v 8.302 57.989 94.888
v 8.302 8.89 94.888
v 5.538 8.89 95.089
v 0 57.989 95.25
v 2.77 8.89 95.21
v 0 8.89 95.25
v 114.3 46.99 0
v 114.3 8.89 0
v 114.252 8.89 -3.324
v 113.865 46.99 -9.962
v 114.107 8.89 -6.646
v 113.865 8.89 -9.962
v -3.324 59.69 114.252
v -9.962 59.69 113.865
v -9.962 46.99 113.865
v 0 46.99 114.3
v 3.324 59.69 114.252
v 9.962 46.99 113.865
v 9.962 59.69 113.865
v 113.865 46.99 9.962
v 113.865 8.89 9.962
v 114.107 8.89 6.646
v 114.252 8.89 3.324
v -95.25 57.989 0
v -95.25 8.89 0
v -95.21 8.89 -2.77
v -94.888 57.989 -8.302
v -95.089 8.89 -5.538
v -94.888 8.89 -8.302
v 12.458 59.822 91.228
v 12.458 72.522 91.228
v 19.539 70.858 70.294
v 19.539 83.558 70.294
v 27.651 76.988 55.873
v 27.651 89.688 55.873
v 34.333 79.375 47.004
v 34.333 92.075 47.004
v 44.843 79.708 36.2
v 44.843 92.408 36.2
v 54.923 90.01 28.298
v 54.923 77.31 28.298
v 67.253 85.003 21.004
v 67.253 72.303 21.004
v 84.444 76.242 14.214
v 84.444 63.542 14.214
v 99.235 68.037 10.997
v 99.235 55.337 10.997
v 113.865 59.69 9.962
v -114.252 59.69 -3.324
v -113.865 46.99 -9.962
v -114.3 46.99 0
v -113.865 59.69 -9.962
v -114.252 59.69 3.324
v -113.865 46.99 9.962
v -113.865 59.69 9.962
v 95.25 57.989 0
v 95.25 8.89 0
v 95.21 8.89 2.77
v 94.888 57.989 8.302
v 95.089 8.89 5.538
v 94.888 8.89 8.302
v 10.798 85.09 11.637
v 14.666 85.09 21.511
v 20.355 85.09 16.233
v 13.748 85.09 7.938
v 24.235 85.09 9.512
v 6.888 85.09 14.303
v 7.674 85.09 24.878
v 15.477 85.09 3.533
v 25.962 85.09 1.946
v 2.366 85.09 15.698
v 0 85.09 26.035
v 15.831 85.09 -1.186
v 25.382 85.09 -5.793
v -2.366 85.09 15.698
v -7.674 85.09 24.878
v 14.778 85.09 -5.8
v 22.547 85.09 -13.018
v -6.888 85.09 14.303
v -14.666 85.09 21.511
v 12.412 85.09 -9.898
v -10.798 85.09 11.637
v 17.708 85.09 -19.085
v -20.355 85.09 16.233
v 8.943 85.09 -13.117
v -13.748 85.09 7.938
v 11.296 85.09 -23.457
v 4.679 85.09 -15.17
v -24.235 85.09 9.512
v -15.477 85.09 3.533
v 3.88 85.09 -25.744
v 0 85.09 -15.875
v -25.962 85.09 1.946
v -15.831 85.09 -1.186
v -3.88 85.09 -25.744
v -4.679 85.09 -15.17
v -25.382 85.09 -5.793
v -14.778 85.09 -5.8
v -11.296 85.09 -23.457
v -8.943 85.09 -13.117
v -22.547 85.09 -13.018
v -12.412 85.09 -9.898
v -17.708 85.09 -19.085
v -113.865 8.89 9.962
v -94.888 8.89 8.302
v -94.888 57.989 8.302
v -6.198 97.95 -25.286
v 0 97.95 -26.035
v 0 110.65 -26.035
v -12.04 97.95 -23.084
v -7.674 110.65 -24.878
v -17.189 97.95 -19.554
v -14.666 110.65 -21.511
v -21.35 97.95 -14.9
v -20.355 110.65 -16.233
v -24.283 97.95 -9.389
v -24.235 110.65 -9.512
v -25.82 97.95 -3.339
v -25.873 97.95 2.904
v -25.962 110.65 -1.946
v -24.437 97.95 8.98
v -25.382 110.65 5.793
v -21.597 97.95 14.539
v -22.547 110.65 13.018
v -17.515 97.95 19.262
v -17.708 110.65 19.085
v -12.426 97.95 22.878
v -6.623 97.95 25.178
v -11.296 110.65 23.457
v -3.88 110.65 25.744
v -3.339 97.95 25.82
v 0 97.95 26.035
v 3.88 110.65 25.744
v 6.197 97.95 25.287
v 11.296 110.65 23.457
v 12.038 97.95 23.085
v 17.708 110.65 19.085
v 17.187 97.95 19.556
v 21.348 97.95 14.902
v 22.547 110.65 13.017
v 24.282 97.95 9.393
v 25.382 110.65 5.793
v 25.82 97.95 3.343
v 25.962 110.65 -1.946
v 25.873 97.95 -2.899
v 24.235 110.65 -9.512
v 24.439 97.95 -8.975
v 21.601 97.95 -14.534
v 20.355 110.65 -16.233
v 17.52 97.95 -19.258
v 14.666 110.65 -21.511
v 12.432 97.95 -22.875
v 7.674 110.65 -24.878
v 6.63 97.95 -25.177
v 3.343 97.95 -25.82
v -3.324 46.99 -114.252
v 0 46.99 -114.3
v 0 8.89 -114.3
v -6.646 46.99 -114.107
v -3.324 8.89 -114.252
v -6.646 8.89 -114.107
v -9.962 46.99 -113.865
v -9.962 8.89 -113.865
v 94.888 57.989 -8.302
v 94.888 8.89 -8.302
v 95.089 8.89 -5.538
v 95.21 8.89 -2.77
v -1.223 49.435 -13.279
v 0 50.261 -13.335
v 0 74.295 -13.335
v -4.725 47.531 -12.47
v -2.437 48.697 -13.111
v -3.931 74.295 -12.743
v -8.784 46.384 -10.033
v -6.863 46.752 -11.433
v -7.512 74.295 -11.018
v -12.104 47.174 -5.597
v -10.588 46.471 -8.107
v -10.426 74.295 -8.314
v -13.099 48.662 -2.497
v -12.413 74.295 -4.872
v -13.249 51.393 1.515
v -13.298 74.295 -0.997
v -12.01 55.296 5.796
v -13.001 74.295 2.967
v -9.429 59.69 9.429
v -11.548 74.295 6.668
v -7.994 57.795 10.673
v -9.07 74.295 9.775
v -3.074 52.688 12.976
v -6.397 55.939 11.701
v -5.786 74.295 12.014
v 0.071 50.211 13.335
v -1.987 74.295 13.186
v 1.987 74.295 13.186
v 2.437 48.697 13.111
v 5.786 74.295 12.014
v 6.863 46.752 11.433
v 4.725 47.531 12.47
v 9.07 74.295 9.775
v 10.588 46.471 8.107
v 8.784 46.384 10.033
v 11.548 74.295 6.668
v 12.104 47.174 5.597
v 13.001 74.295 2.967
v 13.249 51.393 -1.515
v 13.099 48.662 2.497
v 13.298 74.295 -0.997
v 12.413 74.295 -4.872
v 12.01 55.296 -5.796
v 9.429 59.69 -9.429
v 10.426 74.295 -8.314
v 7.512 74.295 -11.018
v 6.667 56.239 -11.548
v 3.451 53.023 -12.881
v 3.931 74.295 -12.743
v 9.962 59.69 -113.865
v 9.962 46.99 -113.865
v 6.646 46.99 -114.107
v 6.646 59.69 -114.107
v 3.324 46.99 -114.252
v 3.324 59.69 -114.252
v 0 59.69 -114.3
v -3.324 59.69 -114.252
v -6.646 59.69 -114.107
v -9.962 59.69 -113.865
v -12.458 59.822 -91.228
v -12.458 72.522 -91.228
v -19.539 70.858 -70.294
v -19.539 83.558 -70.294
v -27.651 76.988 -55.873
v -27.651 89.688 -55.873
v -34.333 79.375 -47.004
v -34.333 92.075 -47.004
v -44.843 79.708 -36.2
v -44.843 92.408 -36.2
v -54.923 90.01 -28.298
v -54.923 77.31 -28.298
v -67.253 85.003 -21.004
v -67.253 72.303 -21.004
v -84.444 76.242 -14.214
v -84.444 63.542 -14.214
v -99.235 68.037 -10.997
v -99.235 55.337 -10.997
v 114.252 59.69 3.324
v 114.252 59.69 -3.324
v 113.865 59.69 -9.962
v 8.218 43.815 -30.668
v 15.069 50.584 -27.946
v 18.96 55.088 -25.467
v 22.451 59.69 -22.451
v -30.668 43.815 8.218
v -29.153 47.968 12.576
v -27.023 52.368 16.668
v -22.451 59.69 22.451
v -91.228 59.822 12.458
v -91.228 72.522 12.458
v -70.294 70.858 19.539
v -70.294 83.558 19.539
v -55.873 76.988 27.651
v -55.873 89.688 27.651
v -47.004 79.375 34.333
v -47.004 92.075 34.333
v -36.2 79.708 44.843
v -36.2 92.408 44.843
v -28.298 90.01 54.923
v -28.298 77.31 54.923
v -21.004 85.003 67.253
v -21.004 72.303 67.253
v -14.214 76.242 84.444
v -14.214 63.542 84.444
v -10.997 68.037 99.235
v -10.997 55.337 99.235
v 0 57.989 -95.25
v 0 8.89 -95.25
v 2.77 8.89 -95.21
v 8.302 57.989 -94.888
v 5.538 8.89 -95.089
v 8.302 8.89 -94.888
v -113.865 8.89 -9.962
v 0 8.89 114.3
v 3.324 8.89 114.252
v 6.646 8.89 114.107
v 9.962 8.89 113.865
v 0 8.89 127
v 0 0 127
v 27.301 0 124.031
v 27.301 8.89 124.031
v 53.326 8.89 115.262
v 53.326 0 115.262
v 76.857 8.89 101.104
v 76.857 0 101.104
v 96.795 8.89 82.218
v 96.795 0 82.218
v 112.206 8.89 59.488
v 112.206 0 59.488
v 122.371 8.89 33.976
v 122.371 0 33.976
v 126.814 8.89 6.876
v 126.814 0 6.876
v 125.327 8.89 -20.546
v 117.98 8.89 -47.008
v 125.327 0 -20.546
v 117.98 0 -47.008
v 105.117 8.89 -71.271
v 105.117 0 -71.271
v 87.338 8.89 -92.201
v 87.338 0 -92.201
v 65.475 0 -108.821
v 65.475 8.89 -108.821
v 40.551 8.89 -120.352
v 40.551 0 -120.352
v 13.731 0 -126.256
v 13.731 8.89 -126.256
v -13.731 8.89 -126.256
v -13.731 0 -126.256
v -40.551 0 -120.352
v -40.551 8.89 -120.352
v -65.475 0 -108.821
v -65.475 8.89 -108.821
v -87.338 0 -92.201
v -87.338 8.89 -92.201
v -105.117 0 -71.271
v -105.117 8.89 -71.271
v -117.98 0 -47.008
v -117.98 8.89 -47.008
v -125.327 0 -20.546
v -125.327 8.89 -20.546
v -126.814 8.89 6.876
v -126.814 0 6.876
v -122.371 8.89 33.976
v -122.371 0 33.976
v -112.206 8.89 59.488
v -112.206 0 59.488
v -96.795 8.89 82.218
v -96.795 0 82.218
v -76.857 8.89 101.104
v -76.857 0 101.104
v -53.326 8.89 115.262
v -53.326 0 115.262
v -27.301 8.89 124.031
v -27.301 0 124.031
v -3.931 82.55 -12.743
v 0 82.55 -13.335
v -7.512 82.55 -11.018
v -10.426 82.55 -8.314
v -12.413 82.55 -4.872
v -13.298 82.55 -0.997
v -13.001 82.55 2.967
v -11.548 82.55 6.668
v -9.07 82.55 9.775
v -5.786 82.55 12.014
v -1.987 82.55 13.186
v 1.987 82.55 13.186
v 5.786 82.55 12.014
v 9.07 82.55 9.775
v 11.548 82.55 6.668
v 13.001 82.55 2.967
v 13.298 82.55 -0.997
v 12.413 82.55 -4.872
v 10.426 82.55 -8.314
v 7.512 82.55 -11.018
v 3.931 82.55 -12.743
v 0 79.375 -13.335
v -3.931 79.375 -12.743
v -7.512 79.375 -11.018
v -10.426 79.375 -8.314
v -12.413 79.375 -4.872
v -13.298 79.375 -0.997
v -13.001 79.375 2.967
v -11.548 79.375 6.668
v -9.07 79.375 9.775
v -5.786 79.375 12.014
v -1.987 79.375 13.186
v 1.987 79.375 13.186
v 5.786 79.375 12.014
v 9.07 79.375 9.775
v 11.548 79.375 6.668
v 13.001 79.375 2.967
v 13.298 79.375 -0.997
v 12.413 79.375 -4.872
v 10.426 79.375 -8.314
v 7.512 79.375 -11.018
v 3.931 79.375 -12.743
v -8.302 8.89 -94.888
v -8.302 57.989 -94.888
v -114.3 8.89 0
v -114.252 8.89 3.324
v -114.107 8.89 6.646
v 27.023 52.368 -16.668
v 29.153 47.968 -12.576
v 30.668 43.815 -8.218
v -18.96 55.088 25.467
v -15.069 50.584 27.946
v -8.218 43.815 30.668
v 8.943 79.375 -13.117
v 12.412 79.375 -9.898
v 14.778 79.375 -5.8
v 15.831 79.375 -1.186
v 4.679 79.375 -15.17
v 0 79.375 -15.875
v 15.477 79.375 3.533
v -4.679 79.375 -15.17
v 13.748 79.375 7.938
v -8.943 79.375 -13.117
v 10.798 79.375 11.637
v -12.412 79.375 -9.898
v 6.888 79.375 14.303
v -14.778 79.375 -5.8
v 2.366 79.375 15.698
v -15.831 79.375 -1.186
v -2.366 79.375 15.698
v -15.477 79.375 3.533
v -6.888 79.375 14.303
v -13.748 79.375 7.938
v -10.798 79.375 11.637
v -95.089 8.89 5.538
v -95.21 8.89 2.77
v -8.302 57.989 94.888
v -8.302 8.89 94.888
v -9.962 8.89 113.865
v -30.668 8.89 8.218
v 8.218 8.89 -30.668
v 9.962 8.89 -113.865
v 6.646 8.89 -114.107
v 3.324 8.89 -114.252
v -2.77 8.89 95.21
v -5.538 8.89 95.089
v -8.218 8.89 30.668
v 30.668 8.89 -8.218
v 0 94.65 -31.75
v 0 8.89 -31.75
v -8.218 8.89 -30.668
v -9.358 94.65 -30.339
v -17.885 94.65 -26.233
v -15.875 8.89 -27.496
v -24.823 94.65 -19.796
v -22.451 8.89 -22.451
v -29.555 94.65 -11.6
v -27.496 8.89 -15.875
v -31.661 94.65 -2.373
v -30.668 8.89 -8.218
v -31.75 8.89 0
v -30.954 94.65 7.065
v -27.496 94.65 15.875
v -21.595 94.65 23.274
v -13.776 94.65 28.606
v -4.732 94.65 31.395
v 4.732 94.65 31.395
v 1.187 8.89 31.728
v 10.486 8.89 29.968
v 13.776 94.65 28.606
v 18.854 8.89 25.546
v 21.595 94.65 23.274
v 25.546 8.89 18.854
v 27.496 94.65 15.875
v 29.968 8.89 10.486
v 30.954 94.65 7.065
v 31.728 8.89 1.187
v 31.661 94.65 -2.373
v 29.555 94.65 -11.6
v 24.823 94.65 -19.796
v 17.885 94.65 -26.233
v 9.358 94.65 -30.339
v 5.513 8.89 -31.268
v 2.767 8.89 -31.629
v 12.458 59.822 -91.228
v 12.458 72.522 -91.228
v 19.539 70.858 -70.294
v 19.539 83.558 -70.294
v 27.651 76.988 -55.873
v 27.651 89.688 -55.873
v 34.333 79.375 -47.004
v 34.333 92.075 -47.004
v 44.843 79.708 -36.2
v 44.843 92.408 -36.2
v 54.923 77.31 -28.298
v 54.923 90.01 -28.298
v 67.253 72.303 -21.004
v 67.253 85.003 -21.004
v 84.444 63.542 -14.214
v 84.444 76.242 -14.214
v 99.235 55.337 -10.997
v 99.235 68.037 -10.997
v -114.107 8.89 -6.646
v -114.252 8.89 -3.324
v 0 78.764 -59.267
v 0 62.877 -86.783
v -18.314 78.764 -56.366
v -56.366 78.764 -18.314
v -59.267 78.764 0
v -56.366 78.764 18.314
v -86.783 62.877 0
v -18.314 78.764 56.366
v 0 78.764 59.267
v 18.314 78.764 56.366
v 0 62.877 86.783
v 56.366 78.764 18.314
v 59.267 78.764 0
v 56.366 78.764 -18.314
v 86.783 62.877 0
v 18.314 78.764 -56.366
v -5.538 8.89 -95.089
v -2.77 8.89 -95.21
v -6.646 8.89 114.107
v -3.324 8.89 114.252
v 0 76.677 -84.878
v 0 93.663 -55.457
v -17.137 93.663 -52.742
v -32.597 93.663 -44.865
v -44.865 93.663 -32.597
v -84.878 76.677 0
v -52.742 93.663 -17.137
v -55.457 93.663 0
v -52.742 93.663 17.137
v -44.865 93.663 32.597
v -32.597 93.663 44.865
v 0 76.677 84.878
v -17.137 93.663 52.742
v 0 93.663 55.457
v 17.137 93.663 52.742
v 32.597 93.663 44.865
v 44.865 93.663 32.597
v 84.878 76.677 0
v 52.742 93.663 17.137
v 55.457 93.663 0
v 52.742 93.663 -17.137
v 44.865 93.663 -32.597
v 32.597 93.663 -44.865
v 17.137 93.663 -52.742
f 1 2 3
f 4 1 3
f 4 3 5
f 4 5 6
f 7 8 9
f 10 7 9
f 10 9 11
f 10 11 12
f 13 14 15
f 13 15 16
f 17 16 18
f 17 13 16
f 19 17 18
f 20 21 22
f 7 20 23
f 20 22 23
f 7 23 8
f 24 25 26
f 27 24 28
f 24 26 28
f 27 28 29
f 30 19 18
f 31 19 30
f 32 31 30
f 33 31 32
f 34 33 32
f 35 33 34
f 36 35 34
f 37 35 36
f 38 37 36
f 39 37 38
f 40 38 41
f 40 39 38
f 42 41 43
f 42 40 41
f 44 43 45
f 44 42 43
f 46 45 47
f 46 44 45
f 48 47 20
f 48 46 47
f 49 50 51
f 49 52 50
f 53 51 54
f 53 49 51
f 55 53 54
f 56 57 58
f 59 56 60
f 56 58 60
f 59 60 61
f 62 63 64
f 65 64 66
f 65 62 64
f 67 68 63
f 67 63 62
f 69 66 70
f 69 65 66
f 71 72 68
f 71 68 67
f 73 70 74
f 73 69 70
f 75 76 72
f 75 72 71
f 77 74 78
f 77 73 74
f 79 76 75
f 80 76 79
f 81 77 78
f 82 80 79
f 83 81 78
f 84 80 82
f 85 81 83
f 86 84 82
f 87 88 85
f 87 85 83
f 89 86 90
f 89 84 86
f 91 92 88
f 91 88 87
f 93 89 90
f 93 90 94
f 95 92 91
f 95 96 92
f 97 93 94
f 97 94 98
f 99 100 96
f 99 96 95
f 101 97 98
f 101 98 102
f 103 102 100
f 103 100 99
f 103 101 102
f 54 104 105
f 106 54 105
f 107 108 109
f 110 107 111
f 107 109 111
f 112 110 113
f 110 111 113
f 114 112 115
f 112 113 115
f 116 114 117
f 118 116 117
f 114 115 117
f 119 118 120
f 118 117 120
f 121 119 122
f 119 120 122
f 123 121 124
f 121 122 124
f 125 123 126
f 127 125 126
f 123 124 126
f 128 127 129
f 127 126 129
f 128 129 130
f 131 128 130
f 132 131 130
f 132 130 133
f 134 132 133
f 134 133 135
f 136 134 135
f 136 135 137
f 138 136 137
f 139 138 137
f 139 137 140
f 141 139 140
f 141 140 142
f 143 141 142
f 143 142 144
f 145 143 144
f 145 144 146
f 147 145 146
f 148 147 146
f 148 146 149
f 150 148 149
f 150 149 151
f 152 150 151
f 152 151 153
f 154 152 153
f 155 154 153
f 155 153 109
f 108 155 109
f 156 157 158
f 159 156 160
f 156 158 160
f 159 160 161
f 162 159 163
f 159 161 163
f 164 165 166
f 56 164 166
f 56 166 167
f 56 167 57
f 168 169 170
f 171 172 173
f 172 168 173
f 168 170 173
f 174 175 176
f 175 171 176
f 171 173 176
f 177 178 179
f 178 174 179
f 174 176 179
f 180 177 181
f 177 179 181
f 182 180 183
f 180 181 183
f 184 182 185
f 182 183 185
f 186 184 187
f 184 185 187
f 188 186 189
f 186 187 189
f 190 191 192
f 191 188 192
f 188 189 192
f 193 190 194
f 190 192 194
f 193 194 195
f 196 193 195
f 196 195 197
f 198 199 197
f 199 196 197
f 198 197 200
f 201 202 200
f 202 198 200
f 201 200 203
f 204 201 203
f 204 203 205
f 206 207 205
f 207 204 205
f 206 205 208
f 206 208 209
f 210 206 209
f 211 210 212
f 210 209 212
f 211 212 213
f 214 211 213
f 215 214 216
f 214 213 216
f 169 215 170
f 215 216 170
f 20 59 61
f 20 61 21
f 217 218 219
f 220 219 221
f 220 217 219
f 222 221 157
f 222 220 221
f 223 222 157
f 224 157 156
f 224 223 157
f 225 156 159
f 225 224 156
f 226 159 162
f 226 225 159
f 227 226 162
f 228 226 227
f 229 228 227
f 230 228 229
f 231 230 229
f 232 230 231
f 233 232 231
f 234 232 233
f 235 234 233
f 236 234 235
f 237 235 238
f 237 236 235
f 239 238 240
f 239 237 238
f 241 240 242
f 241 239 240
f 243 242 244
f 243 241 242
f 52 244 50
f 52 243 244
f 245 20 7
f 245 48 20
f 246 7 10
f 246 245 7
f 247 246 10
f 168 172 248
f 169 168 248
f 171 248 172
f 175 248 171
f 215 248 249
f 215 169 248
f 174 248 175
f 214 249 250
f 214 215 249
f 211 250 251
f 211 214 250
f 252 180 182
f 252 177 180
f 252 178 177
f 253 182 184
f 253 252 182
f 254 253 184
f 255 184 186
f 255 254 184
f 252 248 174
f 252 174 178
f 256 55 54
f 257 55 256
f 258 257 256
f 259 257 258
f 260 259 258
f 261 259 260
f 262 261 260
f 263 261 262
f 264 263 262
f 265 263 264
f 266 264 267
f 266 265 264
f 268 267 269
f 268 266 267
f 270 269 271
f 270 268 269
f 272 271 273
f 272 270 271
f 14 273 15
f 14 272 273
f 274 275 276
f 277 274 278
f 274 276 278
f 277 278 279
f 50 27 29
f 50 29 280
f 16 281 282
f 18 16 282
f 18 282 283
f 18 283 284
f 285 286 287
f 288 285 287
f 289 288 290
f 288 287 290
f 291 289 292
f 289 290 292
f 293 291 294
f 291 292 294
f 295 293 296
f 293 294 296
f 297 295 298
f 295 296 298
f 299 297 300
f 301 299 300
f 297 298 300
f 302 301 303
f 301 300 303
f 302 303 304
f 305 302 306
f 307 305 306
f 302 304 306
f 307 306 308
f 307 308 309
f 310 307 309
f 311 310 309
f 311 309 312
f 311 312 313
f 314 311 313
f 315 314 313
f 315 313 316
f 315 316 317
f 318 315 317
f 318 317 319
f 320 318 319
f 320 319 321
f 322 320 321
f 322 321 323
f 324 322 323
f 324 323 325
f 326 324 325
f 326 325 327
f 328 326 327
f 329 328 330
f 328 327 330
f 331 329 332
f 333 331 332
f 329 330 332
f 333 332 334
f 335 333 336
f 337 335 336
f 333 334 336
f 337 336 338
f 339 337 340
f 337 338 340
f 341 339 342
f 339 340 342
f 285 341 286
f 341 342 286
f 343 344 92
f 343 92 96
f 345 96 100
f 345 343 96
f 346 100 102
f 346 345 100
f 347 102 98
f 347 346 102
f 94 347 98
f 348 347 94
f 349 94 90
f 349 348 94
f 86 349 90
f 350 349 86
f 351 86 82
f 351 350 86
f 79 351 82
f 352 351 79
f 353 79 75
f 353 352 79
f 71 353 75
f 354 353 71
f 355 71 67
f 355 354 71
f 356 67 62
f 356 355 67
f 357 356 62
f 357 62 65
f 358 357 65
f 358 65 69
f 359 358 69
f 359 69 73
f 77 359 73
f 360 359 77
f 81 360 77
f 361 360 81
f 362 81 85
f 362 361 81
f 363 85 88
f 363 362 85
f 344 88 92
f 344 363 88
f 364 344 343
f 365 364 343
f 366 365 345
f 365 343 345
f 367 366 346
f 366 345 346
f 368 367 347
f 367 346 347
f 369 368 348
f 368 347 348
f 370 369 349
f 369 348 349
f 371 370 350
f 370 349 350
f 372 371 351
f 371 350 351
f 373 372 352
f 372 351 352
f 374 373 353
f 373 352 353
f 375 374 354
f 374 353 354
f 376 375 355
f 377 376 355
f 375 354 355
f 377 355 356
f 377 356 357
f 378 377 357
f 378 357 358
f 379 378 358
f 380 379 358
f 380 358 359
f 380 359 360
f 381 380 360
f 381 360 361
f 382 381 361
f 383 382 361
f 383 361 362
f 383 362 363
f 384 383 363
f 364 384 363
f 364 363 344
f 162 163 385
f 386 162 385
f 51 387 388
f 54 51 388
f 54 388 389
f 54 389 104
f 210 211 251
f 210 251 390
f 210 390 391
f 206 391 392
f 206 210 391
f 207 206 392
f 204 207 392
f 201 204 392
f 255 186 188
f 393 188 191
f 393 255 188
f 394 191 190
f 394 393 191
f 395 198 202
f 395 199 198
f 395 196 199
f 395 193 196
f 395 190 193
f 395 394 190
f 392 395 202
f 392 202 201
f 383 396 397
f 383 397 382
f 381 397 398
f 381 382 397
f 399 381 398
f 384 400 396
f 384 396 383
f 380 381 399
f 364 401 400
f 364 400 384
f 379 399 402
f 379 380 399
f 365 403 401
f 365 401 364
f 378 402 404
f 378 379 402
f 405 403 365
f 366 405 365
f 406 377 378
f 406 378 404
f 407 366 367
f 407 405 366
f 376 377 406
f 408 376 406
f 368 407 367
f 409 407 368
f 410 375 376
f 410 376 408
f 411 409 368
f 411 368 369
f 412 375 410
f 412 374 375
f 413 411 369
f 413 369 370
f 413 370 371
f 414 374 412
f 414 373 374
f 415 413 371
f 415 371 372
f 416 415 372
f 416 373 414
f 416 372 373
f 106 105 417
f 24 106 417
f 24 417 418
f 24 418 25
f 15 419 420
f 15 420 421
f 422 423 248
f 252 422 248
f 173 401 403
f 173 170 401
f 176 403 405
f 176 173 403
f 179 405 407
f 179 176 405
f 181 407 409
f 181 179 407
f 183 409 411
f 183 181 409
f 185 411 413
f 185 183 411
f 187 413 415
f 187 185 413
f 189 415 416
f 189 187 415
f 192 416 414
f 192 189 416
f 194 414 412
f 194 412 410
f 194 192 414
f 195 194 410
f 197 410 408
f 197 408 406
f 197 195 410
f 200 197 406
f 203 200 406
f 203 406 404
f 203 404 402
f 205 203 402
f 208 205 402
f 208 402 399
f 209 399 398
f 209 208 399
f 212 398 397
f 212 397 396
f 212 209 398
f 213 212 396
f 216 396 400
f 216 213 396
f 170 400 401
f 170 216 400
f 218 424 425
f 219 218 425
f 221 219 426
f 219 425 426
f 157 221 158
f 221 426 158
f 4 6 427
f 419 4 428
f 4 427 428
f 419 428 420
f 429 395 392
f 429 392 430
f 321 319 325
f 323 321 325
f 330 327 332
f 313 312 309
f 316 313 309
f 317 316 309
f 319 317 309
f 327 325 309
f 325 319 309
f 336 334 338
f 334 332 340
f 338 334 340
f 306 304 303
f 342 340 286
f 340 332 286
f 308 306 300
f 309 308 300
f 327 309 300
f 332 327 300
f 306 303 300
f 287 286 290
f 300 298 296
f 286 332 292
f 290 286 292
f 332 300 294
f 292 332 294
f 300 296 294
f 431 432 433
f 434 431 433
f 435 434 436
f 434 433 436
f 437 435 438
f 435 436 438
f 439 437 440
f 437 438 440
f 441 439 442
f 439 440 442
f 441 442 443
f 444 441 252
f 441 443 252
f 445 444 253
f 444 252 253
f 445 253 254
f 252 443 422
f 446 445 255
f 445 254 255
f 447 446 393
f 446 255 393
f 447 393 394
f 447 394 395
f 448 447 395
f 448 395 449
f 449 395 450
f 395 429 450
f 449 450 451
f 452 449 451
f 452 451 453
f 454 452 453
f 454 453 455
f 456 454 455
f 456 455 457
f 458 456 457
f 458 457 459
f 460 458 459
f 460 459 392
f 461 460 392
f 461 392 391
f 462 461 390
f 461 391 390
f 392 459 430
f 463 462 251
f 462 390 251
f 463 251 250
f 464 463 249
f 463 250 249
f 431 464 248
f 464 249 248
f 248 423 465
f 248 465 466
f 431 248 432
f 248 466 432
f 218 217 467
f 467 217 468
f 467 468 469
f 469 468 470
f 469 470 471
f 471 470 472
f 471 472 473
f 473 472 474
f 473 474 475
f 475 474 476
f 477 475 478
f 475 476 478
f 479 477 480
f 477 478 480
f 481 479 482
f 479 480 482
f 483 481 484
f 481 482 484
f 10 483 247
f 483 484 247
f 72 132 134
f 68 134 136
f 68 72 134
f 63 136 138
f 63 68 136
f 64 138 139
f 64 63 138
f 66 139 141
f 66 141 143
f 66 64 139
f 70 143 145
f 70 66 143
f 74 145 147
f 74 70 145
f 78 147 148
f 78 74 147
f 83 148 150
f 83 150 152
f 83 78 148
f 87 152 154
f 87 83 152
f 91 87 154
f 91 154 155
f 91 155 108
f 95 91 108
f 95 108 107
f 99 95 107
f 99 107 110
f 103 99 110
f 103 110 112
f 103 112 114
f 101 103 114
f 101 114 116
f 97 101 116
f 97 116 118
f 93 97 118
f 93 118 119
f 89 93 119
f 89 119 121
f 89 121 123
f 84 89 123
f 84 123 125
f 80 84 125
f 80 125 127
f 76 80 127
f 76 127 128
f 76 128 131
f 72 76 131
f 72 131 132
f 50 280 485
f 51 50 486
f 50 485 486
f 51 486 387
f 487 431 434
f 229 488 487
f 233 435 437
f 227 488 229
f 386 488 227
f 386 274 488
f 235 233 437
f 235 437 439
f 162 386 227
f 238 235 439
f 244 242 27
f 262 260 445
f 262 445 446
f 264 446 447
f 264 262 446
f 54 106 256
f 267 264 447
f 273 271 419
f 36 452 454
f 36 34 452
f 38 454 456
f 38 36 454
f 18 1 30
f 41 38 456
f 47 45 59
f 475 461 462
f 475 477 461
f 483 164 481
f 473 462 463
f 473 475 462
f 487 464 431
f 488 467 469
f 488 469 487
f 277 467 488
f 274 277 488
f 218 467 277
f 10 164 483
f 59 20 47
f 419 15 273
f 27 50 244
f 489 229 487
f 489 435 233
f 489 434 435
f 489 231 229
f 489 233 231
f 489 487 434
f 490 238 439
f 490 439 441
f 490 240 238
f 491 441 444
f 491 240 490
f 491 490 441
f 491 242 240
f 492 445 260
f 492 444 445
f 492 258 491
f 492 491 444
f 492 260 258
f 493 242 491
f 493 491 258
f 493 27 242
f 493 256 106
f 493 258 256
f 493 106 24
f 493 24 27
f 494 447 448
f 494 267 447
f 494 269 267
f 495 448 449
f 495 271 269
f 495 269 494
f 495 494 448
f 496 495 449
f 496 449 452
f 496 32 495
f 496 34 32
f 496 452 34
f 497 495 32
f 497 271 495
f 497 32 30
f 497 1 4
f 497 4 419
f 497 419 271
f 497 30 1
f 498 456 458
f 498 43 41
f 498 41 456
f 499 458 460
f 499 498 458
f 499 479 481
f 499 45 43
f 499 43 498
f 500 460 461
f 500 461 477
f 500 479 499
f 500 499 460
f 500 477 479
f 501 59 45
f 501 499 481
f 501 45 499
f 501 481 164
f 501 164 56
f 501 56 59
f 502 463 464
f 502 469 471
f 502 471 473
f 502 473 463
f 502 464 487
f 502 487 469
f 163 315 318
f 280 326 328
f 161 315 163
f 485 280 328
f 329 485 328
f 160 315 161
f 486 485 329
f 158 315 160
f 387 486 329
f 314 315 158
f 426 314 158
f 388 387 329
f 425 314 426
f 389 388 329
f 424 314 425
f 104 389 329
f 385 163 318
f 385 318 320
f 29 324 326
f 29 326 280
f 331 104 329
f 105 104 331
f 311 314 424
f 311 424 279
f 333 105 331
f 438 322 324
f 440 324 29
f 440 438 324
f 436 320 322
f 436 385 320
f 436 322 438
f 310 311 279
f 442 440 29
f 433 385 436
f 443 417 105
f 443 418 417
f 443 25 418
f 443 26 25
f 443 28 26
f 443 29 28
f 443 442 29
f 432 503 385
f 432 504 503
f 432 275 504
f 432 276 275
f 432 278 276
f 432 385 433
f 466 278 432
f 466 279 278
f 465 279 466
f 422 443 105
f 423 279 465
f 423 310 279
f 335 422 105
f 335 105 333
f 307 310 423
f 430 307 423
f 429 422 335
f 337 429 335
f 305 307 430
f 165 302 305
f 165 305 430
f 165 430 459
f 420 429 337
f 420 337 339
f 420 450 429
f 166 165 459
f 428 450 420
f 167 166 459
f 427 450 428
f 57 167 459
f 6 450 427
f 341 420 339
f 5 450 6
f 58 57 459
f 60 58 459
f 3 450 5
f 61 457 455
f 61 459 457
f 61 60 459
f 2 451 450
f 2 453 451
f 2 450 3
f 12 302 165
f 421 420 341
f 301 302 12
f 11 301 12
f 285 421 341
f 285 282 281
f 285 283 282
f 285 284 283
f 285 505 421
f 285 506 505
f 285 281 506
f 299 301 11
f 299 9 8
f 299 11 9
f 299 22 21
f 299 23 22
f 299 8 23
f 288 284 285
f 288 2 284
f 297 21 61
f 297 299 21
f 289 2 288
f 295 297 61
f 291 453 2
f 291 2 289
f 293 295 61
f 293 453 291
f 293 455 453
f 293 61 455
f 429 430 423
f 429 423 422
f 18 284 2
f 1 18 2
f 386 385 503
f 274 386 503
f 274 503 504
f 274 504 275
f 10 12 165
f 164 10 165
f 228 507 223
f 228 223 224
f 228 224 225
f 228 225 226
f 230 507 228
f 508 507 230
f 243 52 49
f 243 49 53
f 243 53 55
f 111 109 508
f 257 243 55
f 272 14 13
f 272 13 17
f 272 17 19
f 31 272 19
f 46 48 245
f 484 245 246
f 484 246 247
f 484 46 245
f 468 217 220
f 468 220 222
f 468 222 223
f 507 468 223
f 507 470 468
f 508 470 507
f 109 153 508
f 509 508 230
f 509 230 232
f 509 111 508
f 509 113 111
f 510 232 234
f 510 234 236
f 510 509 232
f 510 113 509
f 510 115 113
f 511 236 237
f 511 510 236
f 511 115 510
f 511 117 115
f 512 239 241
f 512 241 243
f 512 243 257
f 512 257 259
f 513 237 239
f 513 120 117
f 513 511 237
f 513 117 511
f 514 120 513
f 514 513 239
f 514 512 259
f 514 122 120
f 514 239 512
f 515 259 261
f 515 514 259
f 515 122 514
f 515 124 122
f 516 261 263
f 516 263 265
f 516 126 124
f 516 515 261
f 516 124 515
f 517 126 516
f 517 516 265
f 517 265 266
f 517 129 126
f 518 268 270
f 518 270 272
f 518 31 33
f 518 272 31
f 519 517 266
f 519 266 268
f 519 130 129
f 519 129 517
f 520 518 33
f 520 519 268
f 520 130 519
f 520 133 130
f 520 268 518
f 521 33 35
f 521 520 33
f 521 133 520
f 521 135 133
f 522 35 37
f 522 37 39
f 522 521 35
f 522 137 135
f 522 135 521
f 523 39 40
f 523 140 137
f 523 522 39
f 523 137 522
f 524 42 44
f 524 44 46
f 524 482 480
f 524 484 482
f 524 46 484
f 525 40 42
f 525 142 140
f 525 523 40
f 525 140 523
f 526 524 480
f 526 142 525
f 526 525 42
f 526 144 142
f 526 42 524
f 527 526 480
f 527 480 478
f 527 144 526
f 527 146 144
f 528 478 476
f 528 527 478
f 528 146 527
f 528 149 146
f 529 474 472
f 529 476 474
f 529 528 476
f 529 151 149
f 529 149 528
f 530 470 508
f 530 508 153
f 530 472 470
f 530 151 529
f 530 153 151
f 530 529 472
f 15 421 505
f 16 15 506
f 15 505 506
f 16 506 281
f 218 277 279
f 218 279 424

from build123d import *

# Parameters (mm, degrees)
SKETCH1_R                      = 127
BASE_OF_BASE_DEPTH             = 8.89
BALL_BEARING_CUT_REACH         = 221.212
SKETCH8_R                      = 26.035
SUPPORT_REACH                  = 208.429
SUPPORTS_COUNT                 = 4
CUT_FOR_PRINTABIITY_REACH      = 221.212
HOLDER_START                   = 76.2
SKETCH14_R                     = 26.035
SKETCH14_R_2                   = 13.335
HOLDER_FOR_SHOULDER_DEPTH      = 76.2
CENTER_CYLINDER_REACH          = 208.429
SKETCH14_3_R                   = 31.75
SKETCH14_3_R_2                 = 26.035
FUNNEL_INTO_SNAP_IN_PLACE_SIZE = 2.54
ACCESSIBILITY_CUT_DEPTH        = 290.1712073


with BuildPart() as part:
    # Sketch1 → Base of base (new body)
    with BuildSketch(Plane(origin=(0, 0, 0), x_dir=(1, 0, 0), z_dir=(0, 1, 0))):
        with Locations(Location((0, 0, 0), (0, 0, 270))):
            Circle(SKETCH1_R)
    extrude(amount=BASE_OF_BASE_DEPTH)



with BuildPart() as body_2:
    # Sketch7 → Top Part of Base (revolve)
    with BuildSketch(Plane(origin=(0, 0, 0), x_dir=(0, 0, -1), z_dir=(1, 0, 0)), mode=Mode.PRIVATE) as top_part_of_base_sk:
        Polygon((0, 125.681135768), (0, 112.981135768), (-114.3, 46.99), (-114.3, 59.69), align=None)
    revolve(top_part_of_base_sk.sketch.rotate(Axis((0, 8.89, 0), (0, 1, 0)), 180), axis=Axis((0, 8.89, 0), (0, 1, 0)))

    # Ball Bearing Cut: up to this cone (the profile starts outside it)
    ball_bearing_cut_end = Plane(origin=(0, 125.681136, 0), z_dir=(0, -1, 0)).offset(12.700001232) * Cone(1.732e-06, 362.01940299, 209.011998768, align=(Align.CENTER, Align.CENTER, Align.MIN), mode=Mode.PRIVATE)
    # Sketch8 → Ball Bearing Cut (cut, up to the surface)
    with BuildSketch(Plane(origin=(0, 125.681135768, 0), x_dir=(1, 0, 0), z_dir=(0, 1, 0)), mode=Mode.PRIVATE) as ball_bearing_cut_sk1:
        with Locations(Location((0, 0, 0), (0, 0, 90))):
            Circle(SKETCH8_R)
    ball_bearing_cut_tool1 = extrude(ball_bearing_cut_sk1.sketch, amount=-BALL_BEARING_CUT_REACH, mode=Mode.PRIVATE) - ball_bearing_cut_end
    add(ball_bearing_cut_tool1.solids().sort_by_distance((0, 125.681136, 0))[0], mode=Mode.SUBTRACT)


with BuildPart() as part_1:
    add(part.part)

    add(body_2.part)  # Support merges body 2
    # Support: up to this cone (the profile starts inside it)
    support_end = Plane(origin=(0, 8.89, 0), z_dir=(0, -1, 0)).offset(-104.091134768) * Cone(1.732e-06, 854.440186248, 493.311270537, align=(Align.CENTER, Align.CENTER, Align.MIN), mode=Mode.PRIVATE)
    # Sketch10 → Support (add, up to the surface)
    with BuildSketch(Plane(origin=(0, 8.89, 0), x_dir=(1, 0, 0), z_dir=(0, 1, 0)), mode=Mode.PRIVATE) as support_sk1:
        with BuildLine():
            ThreePointArc((-8.301584497, 94.887544993), (-4.154746647, 95.159343106), (0, 95.25))
            Line((0, 95.25), (0, 114.3))
            ThreePointArc((0, 114.3), (-4.985695976, 114.191211727), (-9.961901396, 113.865053992))
            Line((-9.961901396, 113.865053992), (-8.301584497, 94.887544993))
        make_face()
    support_tool1 = extrude(support_sk1.sketch, amount=SUPPORT_REACH, mode=Mode.PRIVATE) & support_end
    # Sketch10 → Support (add, up to the surface)
    with BuildSketch(Plane(origin=(0, 8.89, 0), x_dir=(1, 0, 0), z_dir=(0, 1, 0)), mode=Mode.PRIVATE) as support_sk2:
        with BuildLine():
            Line((0, 114.3), (0, 95.25))
            ThreePointArc((0, 95.25), (4.154746647, 95.159343106), (8.301584497, 94.887544993))
            Line((8.301584497, 94.887544993), (9.961901396, 113.865053992))
            ThreePointArc((9.961901396, 113.865053992), (4.985695976, 114.191211727), (0, 114.3))
        make_face()
    support_tool2 = extrude(support_sk2.sketch, amount=SUPPORT_REACH, mode=Mode.PRIVATE) & support_end
    support = support_tool1.solids().sort_by_distance((-4.581357, 8.89, -104.930336))[0] + support_tool2.solids().sort_by_distance((4.581357, 8.89, -104.930336))[0]
    add(support)

    # Supports: Support ×4 about axis
    supports_axis = Axis((0, 8.89, 0), (0, 1, 0))
    for i in range(1, SUPPORTS_COUNT):
        add(support.rotate(supports_axis, i * 360 / SUPPORTS_COUNT))

    # Cut for Printabiity: up to this cone (the profile starts outside it)
    cut_for_printabiity_end = Plane(origin=(0, 125.681136, 0), z_dir=(0, -1, 0)).offset(12.700001232) * Cone(1.732e-06, 362.01940299, 209.011998768, align=(Align.CENTER, Align.CENTER, Align.MIN), mode=Mode.PRIVATE)
    # Sketch12 → Cut for Printabiity (cut, up to the surface)
    with BuildSketch(Plane(origin=(0, 125.681135768, 0), x_dir=(1, 0, 0), z_dir=(0, 1, 0)), mode=Mode.PRIVATE) as cut_for_printabiity_sk1:
        with BuildLine():
            ThreePointArc((-113.865053992, -9.961901396), (-40.394430205, -40.394430205), (-9.961901396, -113.865053992))
            ThreePointArc((-9.961901396, -113.865053992), (-80.82230509, -80.82230509), (-113.865053992, -9.961901396))
        make_face()
    cut_for_printabiity_tool1 = extrude(cut_for_printabiity_sk1.sketch, amount=-CUT_FOR_PRINTABIITY_REACH, mode=Mode.PRIVATE) - cut_for_printabiity_end
    add(cut_for_printabiity_tool1.solids().sort_by_distance((-60.814886, 125.681136, 60.814886))[0], mode=Mode.SUBTRACT)
    # Sketch12 → Cut for Printabiity (cut, up to the surface)
    with BuildSketch(Plane(origin=(0, 125.681135768, 0), x_dir=(1, 0, 0), z_dir=(0, 1, 0)), mode=Mode.PRIVATE) as cut_for_printabiity_sk2:
        with BuildLine():
            ThreePointArc((-9.961901396, 113.865053992), (-40.394430205, 40.394430205), (-113.865053992, 9.961901396))
            ThreePointArc((-113.865053992, 9.961901396), (-80.82230509, 80.82230509), (-9.961901396, 113.865053992))
        make_face()
    cut_for_printabiity_tool2 = extrude(cut_for_printabiity_sk2.sketch, amount=-CUT_FOR_PRINTABIITY_REACH, mode=Mode.PRIVATE) - cut_for_printabiity_end
    add(cut_for_printabiity_tool2.solids().sort_by_distance((-60.814886, 125.681136, -60.814886))[0], mode=Mode.SUBTRACT)
    # Sketch12 → Cut for Printabiity (cut, up to the surface)
    with BuildSketch(Plane(origin=(0, 125.681135768, 0), x_dir=(1, 0, 0), z_dir=(0, 1, 0)), mode=Mode.PRIVATE) as cut_for_printabiity_sk3:
        with BuildLine():
            ThreePointArc((9.961901396, 113.865053992), (40.394430205, 40.394430205), (113.865053992, 9.961901396))
            ThreePointArc((113.865053992, 9.961901396), (80.82230509, 80.82230509), (9.961901396, 113.865053992))
        make_face()
    cut_for_printabiity_tool3 = extrude(cut_for_printabiity_sk3.sketch, amount=-CUT_FOR_PRINTABIITY_REACH, mode=Mode.PRIVATE) - cut_for_printabiity_end
    add(cut_for_printabiity_tool3.solids().sort_by_distance((60.814886, 125.681136, -60.814886))[0], mode=Mode.SUBTRACT)
    # Sketch12 → Cut for Printabiity (cut, up to the surface)
    with BuildSketch(Plane(origin=(0, 125.681135768, 0), x_dir=(1, 0, 0), z_dir=(0, 1, 0)), mode=Mode.PRIVATE) as cut_for_printabiity_sk4:
        with BuildLine():
            ThreePointArc((9.961901396, -113.865053992), (40.394430205, -40.394430205), (113.865053992, -9.961901396))
            ThreePointArc((113.865053992, -9.961901396), (80.82230509, -80.82230509), (9.961901396, -113.865053992))
        make_face()
    cut_for_printabiity_tool4 = extrude(cut_for_printabiity_sk4.sketch, amount=-CUT_FOR_PRINTABIITY_REACH, mode=Mode.PRIVATE) - cut_for_printabiity_end
    add(cut_for_printabiity_tool4.solids().sort_by_distance((60.814886, 125.681136, 60.814886))[0], mode=Mode.SUBTRACT)

    # Sketch14 → Holder for Shoulder (add)
    with BuildSketch(Plane(origin=(0, 8.89, 0), x_dir=(1, 0, 0), z_dir=(0, 1, 0)).offset(HOLDER_START)):
        with Locations(Location((0, 0, 0), (0, 0, 90))):
            Circle(SKETCH14_R)
        with Locations(Location((0, 0, 0), (0, 0, 90))):
            Circle(SKETCH14_R_2, mode=Mode.SUBTRACT)
    extrude(amount=-HOLDER_FOR_SHOULDER_DEPTH)

    # Center Cylinder: up to this cone (the profile starts inside it)
    center_cylinder_end = Plane(origin=(0, 8.89, 0), z_dir=(0, -1, 0)).offset(-104.091134768) * Cone(1.732e-06, 854.440186248, 493.311270537, align=(Align.CENTER, Align.CENTER, Align.MIN), mode=Mode.PRIVATE)
    # Sketch14<3> → Center Cylinder (add, up to the surface)
    with BuildSketch(Plane(origin=(0, 8.89, 0), x_dir=(1, 0, 0), z_dir=(0, 1, 0)), mode=Mode.PRIVATE) as center_cylinder_sk1:
        with Locations(Location((0, 0, 0), (0, 0, 90))):
            Circle(SKETCH14_3_R)
        with Locations(Location((0, 0, 0), (0, 0, 270))):
            Circle(SKETCH14_3_R_2, mode=Mode.SUBTRACT)
    center_cylinder_tool1 = extrude(center_cylinder_sk1.sketch, amount=CENTER_CYLINDER_REACH, mode=Mode.PRIVATE) & center_cylinder_end
    add(center_cylinder_tool1.solids().sort_by_distance((0, 8.89, 30.851974))[0])

    # Funnel into Snap in Place
    funnel_into_snap_in_place_edges = [part_1.edges().sort_by_distance(p)[0] for p in [
        (0, 85.09, 13.335),
    ]]
    chamfer(funnel_into_snap_in_place_edges, length=FUNNEL_INTO_SNAP_IN_PLACE_SIZE)

    # Sketch19 → Accessibility Cut (cut, through all)
    with BuildSketch(Plane(origin=(-61.913477694, 0, 61.913477694), x_dir=(-0.7071067811865487, 0, -0.7071067811865465), z_dir=(0.7071067811865465, 0, -0.7071067811865487))):
        Polygon((0, 8.89), (15.875, 8.89), (15.875, 43.815), (0, 59.69), (-15.875, 43.815), (-15.875, 8.89), align=None)
    extrude(amount=ACCESSIBILITY_CUT_DEPTH, mode=Mode.SUBTRACT)

    # Sketch20 → Cut-Revolve1 (revolve, cut)
    with BuildSketch(Plane(origin=(0, 0, 0), x_dir=(0, 0, -1), z_dir=(1, 0, 0))):
        Polygon((13.335, 74.295), (13.335, 79.375), (15.875, 79.375), align=None)
    revolve(axis=Axis((0, 8.89, 0), (0, 1, 0)), mode=Mode.SUBTRACT)


solid = part_1.part
